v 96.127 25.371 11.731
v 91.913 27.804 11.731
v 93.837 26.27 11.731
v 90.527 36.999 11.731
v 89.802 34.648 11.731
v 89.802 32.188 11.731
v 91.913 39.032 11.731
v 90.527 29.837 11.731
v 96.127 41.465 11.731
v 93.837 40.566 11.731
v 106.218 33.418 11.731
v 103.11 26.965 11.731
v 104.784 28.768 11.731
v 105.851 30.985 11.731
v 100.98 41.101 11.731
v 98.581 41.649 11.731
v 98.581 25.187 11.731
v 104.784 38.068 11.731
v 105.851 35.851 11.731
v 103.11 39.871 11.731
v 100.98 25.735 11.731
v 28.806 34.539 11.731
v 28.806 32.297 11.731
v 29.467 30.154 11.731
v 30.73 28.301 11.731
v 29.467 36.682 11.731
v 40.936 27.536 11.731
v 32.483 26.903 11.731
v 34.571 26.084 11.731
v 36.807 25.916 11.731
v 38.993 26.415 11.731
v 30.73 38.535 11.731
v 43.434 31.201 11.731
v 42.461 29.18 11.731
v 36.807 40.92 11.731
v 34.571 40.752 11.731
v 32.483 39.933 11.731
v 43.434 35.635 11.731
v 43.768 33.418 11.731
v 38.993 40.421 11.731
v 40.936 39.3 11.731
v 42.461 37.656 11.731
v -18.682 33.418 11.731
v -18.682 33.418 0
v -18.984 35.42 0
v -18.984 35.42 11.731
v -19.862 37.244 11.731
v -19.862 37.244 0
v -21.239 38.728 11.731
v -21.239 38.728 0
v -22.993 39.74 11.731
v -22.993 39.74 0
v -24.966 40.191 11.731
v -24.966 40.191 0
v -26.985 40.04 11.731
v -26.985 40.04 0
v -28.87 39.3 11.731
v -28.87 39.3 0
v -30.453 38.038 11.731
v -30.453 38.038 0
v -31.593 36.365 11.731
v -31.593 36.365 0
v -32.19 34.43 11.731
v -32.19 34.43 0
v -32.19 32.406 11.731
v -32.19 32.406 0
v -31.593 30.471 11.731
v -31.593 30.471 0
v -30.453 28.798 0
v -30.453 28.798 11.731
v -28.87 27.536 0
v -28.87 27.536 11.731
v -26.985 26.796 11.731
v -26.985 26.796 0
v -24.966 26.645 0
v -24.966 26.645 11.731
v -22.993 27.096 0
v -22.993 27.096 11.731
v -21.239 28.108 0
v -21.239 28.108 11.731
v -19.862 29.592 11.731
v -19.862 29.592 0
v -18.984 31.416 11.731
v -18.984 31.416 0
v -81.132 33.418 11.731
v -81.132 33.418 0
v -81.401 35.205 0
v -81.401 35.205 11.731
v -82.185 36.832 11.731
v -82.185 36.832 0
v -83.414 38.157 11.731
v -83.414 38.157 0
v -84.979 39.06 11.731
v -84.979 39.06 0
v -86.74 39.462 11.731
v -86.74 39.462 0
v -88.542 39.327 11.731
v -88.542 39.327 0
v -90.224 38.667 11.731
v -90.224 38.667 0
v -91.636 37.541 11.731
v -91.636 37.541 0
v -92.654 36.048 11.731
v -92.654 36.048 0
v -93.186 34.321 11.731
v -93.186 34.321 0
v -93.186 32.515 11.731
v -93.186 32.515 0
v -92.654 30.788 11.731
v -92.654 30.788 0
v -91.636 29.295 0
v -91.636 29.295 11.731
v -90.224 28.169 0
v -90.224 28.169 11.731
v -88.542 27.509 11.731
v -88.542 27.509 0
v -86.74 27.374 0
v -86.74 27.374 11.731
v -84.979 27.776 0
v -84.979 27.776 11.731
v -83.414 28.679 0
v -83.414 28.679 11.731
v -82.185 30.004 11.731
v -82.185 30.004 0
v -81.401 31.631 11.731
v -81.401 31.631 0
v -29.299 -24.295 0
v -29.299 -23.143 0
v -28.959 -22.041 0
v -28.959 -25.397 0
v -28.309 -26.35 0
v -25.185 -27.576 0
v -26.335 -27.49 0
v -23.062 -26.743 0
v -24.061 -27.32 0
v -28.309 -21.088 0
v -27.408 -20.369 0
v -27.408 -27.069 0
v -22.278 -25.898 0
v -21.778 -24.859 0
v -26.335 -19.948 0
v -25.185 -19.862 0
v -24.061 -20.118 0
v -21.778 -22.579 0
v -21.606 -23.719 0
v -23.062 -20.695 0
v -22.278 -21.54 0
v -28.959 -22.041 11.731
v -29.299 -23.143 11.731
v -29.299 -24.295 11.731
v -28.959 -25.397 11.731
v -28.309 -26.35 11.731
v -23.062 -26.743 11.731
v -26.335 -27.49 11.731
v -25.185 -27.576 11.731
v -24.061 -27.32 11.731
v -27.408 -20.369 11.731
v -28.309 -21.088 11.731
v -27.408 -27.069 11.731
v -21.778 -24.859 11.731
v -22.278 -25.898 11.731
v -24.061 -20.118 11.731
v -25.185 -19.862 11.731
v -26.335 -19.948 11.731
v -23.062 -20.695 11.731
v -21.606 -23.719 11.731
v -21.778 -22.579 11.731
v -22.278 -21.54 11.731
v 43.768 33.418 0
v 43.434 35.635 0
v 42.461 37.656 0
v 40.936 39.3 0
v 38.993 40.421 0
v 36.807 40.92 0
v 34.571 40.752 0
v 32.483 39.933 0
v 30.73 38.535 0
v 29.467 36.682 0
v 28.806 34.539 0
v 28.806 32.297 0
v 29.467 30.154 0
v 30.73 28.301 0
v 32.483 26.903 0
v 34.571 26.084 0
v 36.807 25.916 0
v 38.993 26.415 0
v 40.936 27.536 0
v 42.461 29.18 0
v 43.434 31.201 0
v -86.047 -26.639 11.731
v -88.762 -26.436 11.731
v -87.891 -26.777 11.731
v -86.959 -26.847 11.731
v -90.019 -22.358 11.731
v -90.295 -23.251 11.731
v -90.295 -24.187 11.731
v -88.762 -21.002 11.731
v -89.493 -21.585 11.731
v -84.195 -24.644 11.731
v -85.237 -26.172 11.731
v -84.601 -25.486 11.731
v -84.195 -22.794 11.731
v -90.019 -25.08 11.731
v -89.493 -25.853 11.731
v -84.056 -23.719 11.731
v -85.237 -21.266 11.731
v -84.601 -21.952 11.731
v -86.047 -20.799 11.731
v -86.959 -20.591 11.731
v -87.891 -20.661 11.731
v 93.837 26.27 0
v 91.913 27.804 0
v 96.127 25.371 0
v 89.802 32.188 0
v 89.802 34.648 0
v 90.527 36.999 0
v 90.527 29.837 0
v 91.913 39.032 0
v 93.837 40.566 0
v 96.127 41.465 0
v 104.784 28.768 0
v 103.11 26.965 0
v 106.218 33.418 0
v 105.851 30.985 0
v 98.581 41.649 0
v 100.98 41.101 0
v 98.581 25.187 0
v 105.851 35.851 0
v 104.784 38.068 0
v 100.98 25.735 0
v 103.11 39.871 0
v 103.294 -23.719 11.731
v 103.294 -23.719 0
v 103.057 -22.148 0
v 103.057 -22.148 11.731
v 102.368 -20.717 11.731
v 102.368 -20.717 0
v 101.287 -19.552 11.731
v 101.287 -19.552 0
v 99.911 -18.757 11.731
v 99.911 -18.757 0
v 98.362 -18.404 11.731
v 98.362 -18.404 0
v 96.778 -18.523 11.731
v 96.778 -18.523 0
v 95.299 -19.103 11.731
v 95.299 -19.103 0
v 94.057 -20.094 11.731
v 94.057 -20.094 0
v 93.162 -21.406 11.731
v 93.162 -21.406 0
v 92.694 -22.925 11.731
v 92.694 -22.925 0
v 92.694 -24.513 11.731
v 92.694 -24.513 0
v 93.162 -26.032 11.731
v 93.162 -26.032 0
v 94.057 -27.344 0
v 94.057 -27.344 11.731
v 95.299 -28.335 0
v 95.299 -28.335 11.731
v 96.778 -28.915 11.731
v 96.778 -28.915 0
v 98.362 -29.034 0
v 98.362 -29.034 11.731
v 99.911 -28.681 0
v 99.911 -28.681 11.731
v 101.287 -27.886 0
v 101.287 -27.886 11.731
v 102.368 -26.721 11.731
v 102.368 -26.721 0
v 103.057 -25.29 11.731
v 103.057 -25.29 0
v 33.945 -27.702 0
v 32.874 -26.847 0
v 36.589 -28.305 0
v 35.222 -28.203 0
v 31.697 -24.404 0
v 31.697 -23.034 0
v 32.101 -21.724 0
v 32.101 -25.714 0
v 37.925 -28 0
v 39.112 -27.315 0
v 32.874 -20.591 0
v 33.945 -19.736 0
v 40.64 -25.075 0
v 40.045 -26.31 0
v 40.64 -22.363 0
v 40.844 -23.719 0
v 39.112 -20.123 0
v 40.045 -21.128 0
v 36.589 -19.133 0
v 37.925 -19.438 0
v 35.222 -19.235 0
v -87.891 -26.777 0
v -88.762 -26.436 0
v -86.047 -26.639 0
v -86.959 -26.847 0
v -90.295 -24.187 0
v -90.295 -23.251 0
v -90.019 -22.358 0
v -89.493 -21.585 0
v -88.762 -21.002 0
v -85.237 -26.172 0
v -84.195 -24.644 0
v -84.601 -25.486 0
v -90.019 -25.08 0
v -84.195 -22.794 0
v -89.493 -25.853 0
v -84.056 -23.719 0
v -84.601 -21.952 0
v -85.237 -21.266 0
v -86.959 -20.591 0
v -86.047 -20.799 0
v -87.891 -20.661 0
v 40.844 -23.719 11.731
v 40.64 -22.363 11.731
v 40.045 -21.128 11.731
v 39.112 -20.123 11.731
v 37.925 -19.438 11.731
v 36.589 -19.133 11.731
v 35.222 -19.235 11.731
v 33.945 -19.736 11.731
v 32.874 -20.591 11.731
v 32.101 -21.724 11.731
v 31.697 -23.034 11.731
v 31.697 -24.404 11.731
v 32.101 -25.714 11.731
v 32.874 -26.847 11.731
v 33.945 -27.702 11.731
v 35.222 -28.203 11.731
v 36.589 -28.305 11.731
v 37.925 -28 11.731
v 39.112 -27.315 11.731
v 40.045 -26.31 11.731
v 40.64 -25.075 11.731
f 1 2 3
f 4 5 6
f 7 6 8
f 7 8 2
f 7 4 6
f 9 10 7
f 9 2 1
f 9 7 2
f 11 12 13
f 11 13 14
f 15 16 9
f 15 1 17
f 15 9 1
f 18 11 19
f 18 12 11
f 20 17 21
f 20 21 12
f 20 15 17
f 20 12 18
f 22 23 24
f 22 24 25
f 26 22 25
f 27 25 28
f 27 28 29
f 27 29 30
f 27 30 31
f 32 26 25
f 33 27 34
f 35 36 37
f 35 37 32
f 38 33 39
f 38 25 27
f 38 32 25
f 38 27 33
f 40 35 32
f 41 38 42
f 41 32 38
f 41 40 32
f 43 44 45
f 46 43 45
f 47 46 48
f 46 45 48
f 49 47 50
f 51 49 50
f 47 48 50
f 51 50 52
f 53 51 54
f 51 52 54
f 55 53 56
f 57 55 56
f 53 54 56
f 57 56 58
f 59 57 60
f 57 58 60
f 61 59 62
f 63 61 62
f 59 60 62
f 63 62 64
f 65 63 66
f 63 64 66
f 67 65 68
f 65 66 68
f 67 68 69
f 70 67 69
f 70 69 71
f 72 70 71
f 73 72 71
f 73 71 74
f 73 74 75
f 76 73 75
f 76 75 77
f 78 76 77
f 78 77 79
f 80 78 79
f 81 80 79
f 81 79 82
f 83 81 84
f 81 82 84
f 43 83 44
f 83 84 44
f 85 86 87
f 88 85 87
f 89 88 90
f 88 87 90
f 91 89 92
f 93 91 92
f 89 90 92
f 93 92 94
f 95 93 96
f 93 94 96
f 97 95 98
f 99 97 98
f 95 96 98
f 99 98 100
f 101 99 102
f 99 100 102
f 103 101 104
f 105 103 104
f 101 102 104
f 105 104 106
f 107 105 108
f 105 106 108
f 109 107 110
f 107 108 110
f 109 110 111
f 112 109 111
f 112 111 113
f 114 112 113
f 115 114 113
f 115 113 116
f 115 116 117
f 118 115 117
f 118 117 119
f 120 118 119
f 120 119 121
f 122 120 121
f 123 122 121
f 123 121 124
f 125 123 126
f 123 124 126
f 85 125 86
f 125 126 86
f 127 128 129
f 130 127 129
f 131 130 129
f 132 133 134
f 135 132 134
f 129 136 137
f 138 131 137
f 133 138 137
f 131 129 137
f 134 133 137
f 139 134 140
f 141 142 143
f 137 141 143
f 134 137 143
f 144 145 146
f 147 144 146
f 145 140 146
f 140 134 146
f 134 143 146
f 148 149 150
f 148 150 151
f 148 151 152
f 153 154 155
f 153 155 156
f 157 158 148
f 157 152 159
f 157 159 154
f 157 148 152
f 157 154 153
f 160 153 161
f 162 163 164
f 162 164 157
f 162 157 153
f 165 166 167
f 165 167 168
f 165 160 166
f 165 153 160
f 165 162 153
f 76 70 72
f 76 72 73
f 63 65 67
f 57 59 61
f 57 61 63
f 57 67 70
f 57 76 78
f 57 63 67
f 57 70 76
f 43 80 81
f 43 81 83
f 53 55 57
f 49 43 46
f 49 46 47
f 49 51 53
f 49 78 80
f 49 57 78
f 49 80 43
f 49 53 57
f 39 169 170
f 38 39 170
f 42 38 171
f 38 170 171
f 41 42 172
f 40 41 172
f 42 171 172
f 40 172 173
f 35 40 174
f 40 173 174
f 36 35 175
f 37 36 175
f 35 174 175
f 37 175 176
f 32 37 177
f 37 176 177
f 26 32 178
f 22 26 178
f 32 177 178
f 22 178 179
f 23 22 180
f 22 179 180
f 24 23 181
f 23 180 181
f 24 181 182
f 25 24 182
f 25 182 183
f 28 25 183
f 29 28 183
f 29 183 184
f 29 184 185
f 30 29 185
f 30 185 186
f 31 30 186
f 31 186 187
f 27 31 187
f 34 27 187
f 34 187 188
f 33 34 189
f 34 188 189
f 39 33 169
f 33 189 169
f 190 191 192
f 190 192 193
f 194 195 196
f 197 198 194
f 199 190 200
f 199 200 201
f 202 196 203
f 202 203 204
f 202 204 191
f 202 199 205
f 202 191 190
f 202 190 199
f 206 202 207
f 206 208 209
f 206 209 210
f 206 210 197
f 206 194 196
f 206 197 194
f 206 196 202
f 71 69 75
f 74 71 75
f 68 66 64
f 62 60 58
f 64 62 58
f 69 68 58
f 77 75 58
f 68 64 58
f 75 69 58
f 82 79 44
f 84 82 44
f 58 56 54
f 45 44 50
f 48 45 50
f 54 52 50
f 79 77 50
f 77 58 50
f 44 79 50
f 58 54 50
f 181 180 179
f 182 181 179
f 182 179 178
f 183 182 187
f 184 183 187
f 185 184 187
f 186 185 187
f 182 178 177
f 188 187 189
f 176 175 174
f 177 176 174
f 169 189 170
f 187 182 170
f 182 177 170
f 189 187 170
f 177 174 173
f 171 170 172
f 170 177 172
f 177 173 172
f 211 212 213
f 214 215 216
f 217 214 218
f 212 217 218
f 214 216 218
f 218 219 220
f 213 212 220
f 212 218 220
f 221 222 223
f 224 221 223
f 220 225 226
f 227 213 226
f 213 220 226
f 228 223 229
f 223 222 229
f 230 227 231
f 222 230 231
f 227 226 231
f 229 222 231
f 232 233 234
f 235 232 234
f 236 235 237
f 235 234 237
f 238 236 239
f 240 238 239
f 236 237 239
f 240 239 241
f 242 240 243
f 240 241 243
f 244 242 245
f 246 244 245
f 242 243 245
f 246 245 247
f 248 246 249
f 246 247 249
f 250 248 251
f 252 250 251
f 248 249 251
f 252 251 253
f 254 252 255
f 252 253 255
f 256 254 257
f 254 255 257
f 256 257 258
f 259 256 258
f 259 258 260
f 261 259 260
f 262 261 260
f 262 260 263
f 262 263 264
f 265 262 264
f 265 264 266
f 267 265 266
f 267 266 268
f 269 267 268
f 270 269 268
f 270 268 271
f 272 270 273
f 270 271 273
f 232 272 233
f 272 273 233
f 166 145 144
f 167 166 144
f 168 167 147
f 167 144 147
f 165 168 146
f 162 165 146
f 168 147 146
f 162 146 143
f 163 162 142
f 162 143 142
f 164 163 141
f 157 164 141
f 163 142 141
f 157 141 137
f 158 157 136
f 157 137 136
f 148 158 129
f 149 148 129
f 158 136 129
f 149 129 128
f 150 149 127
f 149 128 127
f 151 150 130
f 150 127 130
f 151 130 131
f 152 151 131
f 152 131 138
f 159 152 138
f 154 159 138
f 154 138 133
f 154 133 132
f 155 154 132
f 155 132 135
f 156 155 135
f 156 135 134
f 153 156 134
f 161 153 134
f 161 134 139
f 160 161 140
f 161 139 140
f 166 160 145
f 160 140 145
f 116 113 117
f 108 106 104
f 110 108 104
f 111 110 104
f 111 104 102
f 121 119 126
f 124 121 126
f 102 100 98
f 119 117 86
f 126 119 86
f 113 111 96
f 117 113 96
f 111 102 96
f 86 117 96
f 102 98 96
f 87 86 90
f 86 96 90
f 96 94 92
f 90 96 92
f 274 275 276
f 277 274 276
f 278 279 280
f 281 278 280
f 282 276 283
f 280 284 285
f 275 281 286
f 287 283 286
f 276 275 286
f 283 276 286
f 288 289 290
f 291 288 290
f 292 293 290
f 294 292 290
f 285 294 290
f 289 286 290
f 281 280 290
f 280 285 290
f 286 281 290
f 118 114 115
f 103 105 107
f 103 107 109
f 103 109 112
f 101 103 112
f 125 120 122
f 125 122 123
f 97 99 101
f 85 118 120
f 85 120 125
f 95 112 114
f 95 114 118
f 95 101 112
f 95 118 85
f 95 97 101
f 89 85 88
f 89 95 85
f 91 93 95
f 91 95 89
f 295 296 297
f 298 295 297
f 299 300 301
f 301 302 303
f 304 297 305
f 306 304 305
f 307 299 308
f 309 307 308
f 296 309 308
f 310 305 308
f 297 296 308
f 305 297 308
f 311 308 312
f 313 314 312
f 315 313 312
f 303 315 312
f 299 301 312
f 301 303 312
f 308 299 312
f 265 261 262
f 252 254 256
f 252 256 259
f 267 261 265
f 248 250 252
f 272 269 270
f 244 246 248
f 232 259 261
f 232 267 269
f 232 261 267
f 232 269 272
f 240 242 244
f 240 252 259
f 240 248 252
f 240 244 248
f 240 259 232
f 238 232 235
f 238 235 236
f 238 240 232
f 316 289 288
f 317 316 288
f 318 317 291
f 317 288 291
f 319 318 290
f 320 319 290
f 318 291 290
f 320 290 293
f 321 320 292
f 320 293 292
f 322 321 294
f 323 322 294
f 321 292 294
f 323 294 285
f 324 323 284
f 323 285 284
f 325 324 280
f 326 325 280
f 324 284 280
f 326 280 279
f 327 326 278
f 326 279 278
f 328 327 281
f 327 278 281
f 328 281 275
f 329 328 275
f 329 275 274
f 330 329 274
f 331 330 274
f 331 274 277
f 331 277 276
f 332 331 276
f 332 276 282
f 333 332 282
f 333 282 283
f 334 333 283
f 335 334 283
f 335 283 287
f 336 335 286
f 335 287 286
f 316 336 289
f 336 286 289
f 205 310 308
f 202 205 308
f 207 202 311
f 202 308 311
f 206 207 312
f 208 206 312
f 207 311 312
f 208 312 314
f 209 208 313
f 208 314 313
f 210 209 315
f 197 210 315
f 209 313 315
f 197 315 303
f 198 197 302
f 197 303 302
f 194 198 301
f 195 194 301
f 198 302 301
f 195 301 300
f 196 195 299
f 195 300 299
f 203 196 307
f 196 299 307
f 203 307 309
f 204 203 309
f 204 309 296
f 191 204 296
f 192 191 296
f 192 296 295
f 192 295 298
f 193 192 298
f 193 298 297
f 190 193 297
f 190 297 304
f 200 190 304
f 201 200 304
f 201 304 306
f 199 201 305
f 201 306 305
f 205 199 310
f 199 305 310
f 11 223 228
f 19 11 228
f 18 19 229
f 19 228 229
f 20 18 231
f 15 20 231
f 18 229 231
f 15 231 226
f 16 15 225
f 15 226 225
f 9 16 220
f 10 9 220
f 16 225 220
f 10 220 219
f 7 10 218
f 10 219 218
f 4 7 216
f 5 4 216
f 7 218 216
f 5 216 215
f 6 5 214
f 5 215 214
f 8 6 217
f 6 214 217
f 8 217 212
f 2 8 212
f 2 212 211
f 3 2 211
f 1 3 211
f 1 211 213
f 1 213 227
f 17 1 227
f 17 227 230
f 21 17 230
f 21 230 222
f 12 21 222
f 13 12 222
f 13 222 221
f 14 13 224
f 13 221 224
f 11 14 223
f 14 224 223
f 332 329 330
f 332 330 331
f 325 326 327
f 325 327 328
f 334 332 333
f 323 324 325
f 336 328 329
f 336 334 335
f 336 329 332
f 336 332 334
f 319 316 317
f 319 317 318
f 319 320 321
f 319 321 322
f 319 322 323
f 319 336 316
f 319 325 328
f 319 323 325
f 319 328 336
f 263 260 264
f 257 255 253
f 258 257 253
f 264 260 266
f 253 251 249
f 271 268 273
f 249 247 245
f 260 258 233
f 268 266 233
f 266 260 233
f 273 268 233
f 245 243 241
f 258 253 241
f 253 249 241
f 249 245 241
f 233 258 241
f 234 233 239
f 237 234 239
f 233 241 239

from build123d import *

# Parameters (mm, degrees)
CURVESKETCH_R     = 3.137
CURVEBOSS_DEPTH   = 11.731
CURVESKETCH_R_2   = 3.868
CURVEBOSS_2_DEPTH = 11.731
CURVESKETCH_R_3   = 4.599
CURVEBOSS_3_DEPTH = 11.731
CURVESKETCH_R_4   = 5.33
CURVEBOSS_4_DEPTH = 11.731
CURVESKETCH_R_5   = 6.061
CURVEBOSS_5_DEPTH = 11.731
CURVESKETCH_R_6   = 6.792
CURVEBOSS_6_DEPTH = 11.731
CURVESKETCH_R_7   = 7.523
CURVEBOSS_7_DEPTH = 11.731
CURVESKETCH_R_8   = 8.254
CURVEBOSS_8_DEPTH = 11.731


with BuildPart() as part:
    # CurveSketch → CurveBoss (new body)
    with BuildSketch(Plane.XY):
        with Locations((-87.193, -23.719)):
            Circle(CURVESKETCH_R)
    extrude(amount=CURVEBOSS_DEPTH)


with BuildPart() as body_2:
    # CurveSketch → CurveBoss 2 (new body)
    with BuildSketch(Plane.XY):
        with Locations((-25.474, -23.719)):
            Circle(CURVESKETCH_R_2)
    extrude(amount=CURVEBOSS_2_DEPTH)


with BuildPart() as body_3:
    # CurveSketch → CurveBoss 3 (new body)
    with BuildSketch(Plane.XY):
        with Locations((36.245, -23.719)):
            Circle(CURVESKETCH_R_3)
    extrude(amount=CURVEBOSS_3_DEPTH)


with BuildPart() as body_4:
    # CurveSketch → CurveBoss 4 (new body)
    with BuildSketch(Plane.XY):
        with Locations((97.964, -23.719)):
            Circle(CURVESKETCH_R_4)
    extrude(amount=CURVEBOSS_4_DEPTH)


with BuildPart() as body_5:
    # CurveSketch → CurveBoss 5 (new body)
    with BuildSketch(Plane.XY):
        with Locations((-87.193, 33.418)):
            Circle(CURVESKETCH_R_5)
    extrude(amount=CURVEBOSS_5_DEPTH)


with BuildPart() as body_6:
    # CurveSketch → CurveBoss 6 (new body)
    with BuildSketch(Plane.XY):
        with Locations((-25.474, 33.418)):
            Circle(CURVESKETCH_R_6)
    extrude(amount=CURVEBOSS_6_DEPTH)


with BuildPart() as body_7:
    # CurveSketch → CurveBoss 7 (new body)
    with BuildSketch(Plane.XY):
        with Locations((36.245, 33.418)):
            Circle(CURVESKETCH_R_7)
    extrude(amount=CURVEBOSS_7_DEPTH)


with BuildPart() as body_8:
    # CurveSketch → CurveBoss 8 (new body)
    with BuildSketch(Plane.XY):
        with Locations((97.964, 33.418)):
            Circle(CURVESKETCH_R_8)
    extrude(amount=CURVEBOSS_8_DEPTH)


solid = Compound([part.part, body_2.part, body_3.part, body_4.part, body_5.part, body_6.part, body_7.part, body_8.part])
